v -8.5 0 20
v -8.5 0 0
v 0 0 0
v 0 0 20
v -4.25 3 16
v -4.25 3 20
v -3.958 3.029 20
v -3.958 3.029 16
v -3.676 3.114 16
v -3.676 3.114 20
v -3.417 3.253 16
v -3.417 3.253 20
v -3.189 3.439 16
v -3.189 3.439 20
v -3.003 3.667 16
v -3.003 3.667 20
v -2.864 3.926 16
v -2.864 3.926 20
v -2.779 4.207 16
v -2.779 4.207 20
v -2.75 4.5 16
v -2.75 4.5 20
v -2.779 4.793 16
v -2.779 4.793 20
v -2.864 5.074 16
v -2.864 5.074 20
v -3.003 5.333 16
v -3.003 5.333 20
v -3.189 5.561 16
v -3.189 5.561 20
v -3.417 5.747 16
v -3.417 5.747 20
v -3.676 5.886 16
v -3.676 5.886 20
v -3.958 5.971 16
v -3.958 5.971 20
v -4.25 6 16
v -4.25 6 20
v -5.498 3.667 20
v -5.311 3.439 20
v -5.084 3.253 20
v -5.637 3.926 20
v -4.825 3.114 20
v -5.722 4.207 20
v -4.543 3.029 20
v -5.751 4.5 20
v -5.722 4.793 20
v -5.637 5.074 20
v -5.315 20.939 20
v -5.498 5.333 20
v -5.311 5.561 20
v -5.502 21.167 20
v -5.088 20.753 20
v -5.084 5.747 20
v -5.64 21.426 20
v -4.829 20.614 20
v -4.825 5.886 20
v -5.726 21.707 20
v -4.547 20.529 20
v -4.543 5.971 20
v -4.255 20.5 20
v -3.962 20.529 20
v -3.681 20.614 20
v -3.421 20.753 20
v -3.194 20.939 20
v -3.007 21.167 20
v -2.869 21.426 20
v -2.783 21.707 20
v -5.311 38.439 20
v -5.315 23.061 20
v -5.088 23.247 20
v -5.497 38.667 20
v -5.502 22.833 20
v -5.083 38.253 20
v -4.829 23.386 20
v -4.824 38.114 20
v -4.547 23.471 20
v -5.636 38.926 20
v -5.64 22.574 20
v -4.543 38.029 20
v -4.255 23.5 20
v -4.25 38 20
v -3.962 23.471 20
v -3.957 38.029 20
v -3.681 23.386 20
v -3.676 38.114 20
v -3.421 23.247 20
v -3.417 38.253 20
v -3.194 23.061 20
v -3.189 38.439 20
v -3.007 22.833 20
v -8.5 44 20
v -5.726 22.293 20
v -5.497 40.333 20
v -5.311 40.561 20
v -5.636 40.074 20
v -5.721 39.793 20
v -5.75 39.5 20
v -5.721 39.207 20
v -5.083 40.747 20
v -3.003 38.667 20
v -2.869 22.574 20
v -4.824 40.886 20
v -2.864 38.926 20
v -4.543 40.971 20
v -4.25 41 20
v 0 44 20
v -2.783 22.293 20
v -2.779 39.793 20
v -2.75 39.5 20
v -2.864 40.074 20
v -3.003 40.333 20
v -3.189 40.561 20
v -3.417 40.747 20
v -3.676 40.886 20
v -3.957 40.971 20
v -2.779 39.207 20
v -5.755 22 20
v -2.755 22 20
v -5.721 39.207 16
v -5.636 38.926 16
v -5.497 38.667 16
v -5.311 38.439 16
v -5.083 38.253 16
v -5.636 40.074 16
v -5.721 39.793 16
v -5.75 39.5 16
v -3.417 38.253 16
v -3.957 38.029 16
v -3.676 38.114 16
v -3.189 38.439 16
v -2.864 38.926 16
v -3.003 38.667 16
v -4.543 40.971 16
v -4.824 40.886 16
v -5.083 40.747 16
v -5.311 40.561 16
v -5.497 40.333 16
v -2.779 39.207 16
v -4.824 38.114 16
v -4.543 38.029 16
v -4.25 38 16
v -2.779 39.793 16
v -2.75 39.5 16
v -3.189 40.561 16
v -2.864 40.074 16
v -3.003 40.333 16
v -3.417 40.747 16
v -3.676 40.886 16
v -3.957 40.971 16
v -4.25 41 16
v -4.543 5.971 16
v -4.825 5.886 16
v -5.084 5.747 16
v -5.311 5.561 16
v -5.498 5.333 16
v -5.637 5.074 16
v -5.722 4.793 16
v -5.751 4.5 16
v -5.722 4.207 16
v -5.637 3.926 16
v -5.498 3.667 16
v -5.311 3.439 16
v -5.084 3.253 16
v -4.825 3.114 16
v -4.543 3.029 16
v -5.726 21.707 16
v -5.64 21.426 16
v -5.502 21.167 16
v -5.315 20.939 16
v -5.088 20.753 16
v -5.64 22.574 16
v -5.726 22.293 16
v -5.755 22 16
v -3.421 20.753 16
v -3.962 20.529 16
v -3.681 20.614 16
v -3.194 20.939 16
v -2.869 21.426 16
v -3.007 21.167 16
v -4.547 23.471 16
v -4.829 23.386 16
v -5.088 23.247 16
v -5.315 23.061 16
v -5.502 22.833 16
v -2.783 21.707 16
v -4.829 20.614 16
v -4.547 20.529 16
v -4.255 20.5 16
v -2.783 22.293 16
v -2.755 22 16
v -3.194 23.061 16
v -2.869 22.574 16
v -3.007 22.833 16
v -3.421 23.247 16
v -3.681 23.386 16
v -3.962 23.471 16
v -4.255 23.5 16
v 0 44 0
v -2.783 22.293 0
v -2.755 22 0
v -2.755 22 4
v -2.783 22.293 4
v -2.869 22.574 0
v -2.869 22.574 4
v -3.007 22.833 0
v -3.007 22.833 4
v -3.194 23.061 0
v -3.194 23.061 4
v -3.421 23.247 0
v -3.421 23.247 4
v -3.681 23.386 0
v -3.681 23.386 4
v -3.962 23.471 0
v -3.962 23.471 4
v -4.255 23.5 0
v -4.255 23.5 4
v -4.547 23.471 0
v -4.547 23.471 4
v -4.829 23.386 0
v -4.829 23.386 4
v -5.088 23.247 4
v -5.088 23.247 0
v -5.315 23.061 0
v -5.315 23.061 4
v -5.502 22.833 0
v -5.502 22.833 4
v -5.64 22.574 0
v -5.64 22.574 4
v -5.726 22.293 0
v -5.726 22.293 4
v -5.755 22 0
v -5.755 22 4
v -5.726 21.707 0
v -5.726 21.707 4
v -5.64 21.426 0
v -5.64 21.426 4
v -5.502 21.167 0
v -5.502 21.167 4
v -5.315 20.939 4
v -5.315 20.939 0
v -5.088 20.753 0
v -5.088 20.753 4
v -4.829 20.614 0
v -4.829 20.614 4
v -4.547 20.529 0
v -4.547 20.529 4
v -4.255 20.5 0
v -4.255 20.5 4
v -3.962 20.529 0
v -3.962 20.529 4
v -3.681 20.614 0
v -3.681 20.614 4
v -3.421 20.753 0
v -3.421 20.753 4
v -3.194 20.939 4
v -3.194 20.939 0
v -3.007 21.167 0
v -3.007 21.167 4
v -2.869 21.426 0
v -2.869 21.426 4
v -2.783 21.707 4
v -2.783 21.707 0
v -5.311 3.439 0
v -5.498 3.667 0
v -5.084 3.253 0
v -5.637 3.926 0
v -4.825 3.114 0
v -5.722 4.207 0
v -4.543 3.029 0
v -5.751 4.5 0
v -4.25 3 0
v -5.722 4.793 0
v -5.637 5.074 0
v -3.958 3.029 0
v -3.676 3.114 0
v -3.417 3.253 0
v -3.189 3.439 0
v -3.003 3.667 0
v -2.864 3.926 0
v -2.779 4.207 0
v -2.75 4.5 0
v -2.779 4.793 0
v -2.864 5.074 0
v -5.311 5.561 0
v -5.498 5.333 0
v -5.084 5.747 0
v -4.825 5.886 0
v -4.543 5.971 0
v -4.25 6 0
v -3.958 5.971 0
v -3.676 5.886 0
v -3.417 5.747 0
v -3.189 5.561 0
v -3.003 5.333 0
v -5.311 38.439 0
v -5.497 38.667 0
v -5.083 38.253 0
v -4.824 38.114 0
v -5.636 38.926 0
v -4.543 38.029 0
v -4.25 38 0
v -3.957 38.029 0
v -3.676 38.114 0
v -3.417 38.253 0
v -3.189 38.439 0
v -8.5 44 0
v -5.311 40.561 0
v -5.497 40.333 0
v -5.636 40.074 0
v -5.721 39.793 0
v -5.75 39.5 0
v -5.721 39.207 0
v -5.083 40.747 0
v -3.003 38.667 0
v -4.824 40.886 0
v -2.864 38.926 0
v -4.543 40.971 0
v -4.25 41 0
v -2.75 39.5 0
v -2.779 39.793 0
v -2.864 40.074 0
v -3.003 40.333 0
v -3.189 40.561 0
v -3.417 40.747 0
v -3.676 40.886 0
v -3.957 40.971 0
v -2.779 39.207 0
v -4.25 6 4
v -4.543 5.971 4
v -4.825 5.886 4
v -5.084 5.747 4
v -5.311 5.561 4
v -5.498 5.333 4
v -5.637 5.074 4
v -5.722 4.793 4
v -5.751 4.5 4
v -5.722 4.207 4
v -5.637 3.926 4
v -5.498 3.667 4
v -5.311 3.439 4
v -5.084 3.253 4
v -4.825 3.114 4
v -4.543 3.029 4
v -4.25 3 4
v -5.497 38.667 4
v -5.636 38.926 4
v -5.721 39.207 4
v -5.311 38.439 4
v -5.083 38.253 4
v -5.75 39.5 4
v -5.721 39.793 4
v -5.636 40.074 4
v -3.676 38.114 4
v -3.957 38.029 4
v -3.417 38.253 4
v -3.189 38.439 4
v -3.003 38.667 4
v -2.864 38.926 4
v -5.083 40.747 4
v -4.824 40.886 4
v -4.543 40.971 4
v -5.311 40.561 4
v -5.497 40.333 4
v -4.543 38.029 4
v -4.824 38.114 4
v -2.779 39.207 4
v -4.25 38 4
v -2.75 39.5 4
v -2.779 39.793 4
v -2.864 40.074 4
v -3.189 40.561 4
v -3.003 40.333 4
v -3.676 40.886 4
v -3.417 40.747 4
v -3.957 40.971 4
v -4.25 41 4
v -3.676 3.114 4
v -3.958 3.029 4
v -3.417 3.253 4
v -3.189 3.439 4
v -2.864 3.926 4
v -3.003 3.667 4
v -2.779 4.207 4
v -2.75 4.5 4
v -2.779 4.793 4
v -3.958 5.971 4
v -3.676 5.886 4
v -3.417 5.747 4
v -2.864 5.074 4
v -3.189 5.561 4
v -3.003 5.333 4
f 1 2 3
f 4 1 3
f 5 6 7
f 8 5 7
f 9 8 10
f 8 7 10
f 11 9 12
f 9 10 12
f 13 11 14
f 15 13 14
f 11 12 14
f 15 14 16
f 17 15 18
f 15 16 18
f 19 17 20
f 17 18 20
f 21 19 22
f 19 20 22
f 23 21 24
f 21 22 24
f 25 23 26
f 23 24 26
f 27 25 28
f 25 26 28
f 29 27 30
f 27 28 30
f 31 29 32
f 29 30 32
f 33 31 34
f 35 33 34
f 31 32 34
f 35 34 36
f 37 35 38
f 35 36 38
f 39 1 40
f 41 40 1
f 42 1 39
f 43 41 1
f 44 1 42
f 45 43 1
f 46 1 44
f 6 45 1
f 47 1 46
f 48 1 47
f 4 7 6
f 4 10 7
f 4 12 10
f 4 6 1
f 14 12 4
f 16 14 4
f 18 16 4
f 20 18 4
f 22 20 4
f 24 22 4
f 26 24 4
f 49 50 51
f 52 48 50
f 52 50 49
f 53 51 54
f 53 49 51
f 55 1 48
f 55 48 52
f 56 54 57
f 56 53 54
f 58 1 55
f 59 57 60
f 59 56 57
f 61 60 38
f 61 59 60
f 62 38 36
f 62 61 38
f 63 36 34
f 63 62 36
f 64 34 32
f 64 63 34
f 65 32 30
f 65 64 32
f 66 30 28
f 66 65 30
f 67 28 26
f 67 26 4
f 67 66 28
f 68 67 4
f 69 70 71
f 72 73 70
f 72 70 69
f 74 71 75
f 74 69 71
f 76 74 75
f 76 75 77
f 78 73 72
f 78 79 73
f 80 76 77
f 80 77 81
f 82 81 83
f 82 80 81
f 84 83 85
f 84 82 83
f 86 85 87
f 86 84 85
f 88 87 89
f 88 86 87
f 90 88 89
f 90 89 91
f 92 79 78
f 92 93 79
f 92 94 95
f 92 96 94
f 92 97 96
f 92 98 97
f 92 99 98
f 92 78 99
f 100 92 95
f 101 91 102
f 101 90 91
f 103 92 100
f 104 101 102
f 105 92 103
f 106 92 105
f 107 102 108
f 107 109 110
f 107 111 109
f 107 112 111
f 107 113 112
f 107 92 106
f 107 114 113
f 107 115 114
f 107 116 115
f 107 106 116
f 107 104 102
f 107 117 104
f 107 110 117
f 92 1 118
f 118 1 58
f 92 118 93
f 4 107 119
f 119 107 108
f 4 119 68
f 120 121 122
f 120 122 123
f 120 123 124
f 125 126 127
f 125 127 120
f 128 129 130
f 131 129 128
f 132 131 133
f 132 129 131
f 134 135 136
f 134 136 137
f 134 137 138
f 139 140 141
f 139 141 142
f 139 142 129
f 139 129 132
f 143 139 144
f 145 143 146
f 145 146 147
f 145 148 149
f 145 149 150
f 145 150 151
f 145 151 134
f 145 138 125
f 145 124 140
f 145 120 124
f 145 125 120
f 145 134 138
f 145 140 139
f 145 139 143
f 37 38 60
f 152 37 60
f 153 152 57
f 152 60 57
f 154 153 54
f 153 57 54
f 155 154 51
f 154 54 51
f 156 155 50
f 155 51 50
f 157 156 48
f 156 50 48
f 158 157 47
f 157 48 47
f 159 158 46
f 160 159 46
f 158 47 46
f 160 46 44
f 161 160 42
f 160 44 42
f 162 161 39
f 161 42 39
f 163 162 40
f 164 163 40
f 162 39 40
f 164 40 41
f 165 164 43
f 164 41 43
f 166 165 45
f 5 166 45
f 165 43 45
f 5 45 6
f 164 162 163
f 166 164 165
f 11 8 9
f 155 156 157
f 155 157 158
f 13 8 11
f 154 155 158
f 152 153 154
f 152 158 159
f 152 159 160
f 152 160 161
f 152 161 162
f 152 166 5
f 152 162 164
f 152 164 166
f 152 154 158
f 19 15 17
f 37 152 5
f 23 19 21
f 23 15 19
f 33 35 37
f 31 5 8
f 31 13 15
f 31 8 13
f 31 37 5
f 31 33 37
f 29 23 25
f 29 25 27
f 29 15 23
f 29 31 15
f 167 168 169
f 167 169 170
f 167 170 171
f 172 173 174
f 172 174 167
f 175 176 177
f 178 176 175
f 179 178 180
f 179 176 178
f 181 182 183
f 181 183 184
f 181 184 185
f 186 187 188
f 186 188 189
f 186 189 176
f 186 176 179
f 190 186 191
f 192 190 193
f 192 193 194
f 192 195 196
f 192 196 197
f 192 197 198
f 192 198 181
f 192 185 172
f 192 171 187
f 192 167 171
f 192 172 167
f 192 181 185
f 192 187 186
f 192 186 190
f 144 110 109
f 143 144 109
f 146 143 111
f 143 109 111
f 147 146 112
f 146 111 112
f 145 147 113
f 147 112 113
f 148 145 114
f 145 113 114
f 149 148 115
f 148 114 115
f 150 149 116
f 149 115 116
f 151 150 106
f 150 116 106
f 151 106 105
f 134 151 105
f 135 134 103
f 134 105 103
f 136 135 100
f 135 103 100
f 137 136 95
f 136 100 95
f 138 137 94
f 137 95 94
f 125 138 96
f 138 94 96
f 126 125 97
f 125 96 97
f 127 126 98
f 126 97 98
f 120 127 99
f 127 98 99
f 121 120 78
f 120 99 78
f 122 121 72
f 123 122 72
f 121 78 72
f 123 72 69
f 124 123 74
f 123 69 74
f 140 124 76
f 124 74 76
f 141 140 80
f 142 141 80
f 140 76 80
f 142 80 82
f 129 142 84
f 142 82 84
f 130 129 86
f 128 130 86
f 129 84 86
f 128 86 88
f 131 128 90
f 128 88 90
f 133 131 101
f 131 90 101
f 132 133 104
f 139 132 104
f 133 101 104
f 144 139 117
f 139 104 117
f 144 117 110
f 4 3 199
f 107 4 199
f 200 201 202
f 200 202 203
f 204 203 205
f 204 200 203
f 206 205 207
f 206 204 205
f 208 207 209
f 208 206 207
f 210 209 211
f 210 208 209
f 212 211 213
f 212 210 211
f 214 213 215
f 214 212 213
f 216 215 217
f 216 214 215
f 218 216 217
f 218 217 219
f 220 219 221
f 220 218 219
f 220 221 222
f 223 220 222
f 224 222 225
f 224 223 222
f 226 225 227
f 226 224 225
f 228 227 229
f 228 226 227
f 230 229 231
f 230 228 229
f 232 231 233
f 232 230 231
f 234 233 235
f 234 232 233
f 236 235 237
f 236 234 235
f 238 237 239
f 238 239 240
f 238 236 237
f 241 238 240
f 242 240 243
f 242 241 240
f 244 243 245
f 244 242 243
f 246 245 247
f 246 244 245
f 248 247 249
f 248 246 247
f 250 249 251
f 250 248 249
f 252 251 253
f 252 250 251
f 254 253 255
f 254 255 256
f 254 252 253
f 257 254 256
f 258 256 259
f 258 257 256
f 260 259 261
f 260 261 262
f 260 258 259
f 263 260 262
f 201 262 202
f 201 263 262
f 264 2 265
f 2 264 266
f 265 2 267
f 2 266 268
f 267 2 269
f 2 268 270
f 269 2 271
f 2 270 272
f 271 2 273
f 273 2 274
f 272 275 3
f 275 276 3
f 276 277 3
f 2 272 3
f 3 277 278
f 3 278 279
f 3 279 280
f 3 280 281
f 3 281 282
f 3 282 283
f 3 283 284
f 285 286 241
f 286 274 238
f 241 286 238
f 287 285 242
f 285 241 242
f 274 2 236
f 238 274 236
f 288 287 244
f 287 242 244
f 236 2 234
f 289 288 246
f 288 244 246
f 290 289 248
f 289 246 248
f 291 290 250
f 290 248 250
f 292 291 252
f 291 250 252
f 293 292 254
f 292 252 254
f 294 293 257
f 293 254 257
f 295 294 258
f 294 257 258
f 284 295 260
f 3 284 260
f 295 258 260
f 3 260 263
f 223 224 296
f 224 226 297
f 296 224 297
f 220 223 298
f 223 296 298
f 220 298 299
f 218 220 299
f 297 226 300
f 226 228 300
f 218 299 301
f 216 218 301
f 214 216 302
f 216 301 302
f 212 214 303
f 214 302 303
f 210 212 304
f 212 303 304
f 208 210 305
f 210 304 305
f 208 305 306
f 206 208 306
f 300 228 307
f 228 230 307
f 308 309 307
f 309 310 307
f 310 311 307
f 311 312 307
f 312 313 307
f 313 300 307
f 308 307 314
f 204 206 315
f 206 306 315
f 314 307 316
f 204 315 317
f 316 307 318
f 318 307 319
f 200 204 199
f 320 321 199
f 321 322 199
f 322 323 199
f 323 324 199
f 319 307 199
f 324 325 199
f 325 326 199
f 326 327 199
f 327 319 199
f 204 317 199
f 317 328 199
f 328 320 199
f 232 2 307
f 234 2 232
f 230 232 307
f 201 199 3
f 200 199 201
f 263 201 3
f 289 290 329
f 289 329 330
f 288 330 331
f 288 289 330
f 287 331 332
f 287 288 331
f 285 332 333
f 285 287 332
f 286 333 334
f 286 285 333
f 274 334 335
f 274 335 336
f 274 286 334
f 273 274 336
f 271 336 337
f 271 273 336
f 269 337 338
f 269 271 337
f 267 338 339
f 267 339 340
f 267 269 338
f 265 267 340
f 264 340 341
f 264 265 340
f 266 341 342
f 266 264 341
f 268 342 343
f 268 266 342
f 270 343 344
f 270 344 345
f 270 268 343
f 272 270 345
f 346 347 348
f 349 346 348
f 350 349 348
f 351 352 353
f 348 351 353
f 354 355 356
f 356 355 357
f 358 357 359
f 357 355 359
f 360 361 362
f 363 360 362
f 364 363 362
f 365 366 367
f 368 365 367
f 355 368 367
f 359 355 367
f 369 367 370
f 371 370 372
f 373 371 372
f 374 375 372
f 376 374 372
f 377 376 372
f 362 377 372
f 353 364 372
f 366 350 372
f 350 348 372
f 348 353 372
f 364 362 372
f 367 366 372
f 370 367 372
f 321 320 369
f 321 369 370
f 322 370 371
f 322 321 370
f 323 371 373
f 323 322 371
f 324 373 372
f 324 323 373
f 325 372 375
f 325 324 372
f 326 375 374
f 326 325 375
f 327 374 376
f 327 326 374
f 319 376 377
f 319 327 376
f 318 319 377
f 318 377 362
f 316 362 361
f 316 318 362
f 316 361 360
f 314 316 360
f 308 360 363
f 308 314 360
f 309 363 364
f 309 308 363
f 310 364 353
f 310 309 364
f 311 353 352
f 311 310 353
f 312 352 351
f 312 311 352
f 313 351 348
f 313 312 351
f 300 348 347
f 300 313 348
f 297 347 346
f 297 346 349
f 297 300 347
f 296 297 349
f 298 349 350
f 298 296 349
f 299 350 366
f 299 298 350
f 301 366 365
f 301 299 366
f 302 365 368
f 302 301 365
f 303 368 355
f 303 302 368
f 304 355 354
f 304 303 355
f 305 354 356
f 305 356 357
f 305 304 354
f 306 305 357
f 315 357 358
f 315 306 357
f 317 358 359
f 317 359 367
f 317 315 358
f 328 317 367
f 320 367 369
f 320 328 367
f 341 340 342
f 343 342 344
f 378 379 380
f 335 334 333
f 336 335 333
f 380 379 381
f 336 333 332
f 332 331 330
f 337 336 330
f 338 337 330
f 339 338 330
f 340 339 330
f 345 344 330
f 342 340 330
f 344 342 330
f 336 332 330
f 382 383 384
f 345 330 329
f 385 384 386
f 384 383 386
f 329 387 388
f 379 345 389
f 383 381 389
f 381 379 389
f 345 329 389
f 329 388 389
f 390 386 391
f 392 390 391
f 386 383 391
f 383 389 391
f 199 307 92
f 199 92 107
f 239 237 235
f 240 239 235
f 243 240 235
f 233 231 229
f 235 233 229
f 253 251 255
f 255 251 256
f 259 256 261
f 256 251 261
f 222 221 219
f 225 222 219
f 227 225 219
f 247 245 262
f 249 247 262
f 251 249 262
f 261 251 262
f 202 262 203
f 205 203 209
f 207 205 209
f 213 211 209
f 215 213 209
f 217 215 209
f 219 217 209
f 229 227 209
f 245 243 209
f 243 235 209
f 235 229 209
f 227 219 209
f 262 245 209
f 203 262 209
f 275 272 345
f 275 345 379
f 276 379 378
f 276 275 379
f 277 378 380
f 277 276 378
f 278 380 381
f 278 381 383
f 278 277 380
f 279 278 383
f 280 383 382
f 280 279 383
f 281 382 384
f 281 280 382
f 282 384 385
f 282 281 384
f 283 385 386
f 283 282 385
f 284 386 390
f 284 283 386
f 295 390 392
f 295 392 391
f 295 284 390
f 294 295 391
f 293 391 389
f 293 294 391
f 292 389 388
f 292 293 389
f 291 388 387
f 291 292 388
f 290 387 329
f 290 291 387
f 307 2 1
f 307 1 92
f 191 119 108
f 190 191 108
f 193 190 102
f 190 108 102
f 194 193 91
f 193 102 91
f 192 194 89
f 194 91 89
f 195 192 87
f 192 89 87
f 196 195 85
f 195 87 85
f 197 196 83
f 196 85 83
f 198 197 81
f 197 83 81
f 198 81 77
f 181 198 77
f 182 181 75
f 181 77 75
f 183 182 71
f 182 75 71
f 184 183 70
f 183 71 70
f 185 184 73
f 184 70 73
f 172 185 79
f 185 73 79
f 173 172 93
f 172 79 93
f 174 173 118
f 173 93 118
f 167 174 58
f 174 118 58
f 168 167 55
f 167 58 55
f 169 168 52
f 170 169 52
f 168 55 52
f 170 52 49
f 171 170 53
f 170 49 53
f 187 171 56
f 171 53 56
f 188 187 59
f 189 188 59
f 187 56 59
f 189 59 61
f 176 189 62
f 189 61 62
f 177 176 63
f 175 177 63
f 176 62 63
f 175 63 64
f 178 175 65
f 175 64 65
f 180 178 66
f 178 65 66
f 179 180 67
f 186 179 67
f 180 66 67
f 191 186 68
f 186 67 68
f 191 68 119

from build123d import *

# Parameters (mm, degrees)
SKETCH014_W   = 8.5
SKETCH014_H   = 44
PAD_DEPTH     = 20
SKETCH008_R   = 1.5
HOLE_DEPTH    = 4
SKETCH018_R   = 1.5
HOLE002_DEPTH = 4


with BuildPart() as part:
    # Sketch014 → Pad (new body)
    with BuildSketch(Plane.XY):
        with Locations((-4.25, 22)):
            Rectangle(SKETCH014_W, SKETCH014_H)
    extrude(amount=PAD_DEPTH)

    # Sketch008 → Hole (cut)
    with BuildSketch(Plane.XY):
        with Locations((-4.250802, 4.5)):
            Circle(SKETCH008_R)
        with Locations((-4.25, 39.499999)):
            Circle(SKETCH008_R)
        with Locations((-4.254534, 22)):
            Circle(SKETCH008_R)
        with Locations((-4.25, 4.5)):
            Circle(SKETCH008_R)
    extrude(amount=HOLE_DEPTH, mode=Mode.SUBTRACT)

    # Sketch018 (on Face5 of Hole) → Hole002 (cut)
    with BuildSketch(Plane.XY.offset(20)):
        with Locations((-4.250802, 4.5)):
            Circle(SKETCH018_R)
        with Locations((-4.25, 39.499999)):
            Circle(SKETCH018_R)
        with Locations((-4.254534, 22)):
            Circle(SKETCH018_R)
        with Locations((-4.25, 4.5)):
            Circle(SKETCH018_R)
    extrude(amount=-HOLE002_DEPTH, mode=Mode.SUBTRACT)


solid = part.part
